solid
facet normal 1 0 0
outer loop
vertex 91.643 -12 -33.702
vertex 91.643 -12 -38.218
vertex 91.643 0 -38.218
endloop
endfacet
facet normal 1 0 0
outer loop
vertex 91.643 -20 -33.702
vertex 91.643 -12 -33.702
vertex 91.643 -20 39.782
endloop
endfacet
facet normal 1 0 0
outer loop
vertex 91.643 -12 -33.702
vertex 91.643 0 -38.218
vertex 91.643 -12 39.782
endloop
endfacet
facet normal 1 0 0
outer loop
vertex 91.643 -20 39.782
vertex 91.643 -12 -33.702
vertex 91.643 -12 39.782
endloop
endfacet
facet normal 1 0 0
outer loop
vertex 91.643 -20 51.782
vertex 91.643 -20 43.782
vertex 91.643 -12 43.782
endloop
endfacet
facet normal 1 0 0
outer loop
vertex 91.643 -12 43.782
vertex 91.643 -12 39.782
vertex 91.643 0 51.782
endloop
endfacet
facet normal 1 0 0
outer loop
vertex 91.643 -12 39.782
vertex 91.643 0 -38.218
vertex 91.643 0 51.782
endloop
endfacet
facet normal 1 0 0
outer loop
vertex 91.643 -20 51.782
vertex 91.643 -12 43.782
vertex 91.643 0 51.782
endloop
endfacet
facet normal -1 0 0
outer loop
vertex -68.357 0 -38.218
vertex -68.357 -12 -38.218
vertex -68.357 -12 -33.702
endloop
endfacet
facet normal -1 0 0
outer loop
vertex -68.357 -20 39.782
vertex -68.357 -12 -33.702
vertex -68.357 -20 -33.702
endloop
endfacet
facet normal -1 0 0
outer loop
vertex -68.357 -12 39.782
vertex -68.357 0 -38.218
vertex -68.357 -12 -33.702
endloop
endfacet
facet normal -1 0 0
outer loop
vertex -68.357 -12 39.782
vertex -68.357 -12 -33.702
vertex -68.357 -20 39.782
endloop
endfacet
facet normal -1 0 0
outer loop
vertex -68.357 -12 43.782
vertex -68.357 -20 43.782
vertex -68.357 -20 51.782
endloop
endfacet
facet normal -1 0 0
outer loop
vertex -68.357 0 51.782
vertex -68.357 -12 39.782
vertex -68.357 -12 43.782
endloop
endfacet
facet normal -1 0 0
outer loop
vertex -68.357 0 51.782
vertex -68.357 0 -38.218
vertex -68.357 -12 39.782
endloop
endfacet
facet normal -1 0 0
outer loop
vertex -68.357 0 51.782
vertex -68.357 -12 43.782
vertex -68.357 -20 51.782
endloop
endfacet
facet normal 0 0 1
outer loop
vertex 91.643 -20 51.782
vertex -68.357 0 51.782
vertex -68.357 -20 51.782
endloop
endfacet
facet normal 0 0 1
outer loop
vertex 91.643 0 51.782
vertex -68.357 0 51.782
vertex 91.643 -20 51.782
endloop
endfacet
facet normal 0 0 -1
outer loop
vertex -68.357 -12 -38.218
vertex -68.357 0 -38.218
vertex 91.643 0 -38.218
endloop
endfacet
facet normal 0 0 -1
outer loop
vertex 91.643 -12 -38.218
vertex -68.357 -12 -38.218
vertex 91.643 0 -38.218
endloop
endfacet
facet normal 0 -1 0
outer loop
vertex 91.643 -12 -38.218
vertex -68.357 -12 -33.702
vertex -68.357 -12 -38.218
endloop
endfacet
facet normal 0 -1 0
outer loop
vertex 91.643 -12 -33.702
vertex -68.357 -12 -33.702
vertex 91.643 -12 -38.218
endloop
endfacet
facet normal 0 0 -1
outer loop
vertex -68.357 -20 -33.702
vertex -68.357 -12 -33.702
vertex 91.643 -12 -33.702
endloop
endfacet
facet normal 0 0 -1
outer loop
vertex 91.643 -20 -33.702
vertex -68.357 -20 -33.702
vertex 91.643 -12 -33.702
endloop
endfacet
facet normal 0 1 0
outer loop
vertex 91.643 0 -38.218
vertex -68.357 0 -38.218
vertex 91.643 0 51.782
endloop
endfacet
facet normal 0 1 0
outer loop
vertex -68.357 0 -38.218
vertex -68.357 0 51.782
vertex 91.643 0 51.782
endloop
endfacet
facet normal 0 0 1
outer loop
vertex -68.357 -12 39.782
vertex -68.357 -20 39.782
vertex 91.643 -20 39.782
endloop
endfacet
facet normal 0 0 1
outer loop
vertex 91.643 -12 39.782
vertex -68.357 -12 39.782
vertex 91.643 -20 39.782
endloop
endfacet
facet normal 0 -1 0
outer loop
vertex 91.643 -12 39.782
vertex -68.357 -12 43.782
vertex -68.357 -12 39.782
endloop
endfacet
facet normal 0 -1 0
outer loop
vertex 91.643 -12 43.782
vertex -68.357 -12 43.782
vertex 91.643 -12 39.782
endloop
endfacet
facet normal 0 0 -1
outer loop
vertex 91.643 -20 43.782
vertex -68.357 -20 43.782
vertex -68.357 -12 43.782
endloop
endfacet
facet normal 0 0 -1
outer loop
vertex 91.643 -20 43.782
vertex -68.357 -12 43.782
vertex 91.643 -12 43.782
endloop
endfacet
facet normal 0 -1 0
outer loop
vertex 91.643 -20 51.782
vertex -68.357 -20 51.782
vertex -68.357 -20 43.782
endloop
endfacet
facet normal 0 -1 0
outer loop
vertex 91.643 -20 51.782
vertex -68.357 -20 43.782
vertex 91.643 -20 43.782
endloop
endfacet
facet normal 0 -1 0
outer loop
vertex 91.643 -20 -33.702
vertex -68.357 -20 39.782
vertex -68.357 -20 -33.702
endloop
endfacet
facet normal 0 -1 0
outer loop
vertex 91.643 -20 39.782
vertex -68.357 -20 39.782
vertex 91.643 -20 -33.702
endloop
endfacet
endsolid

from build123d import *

# Parameters (mm, degrees)
F0_W     = 160
F0_H     = 85.483871
F1_DEPTH = 20
F0_H_2   = 4.516129
F2_DEPTH = 12
F3_W     = 160
F3_H     = 4
F4_DEPTH = 8


with BuildPart() as f1:
    # F0 (on Front) → F1 (new body)
    with BuildSketch(Plane.XZ):
        with Locations((11.642713, 9.040126)):
            Rectangle(F0_W, F0_H)
    extrude(amount=F1_DEPTH)

    # F0 (on Front) → F2 (join)
    with BuildSketch(Plane.XZ):
        with Locations((11.642713, -35.959874)):
            Rectangle(F0_W, F0_H_2)
    extrude(amount=F2_DEPTH)

    # F3 (on face) → F4 (cut)
    with BuildSketch(Plane.XZ.offset(20)):
        with Locations((11.642713, 41.782062)):
            Rectangle(F3_W, F3_H)
    extrude(amount=-F4_DEPTH, mode=Mode.SUBTRACT)


solid = f1.part
